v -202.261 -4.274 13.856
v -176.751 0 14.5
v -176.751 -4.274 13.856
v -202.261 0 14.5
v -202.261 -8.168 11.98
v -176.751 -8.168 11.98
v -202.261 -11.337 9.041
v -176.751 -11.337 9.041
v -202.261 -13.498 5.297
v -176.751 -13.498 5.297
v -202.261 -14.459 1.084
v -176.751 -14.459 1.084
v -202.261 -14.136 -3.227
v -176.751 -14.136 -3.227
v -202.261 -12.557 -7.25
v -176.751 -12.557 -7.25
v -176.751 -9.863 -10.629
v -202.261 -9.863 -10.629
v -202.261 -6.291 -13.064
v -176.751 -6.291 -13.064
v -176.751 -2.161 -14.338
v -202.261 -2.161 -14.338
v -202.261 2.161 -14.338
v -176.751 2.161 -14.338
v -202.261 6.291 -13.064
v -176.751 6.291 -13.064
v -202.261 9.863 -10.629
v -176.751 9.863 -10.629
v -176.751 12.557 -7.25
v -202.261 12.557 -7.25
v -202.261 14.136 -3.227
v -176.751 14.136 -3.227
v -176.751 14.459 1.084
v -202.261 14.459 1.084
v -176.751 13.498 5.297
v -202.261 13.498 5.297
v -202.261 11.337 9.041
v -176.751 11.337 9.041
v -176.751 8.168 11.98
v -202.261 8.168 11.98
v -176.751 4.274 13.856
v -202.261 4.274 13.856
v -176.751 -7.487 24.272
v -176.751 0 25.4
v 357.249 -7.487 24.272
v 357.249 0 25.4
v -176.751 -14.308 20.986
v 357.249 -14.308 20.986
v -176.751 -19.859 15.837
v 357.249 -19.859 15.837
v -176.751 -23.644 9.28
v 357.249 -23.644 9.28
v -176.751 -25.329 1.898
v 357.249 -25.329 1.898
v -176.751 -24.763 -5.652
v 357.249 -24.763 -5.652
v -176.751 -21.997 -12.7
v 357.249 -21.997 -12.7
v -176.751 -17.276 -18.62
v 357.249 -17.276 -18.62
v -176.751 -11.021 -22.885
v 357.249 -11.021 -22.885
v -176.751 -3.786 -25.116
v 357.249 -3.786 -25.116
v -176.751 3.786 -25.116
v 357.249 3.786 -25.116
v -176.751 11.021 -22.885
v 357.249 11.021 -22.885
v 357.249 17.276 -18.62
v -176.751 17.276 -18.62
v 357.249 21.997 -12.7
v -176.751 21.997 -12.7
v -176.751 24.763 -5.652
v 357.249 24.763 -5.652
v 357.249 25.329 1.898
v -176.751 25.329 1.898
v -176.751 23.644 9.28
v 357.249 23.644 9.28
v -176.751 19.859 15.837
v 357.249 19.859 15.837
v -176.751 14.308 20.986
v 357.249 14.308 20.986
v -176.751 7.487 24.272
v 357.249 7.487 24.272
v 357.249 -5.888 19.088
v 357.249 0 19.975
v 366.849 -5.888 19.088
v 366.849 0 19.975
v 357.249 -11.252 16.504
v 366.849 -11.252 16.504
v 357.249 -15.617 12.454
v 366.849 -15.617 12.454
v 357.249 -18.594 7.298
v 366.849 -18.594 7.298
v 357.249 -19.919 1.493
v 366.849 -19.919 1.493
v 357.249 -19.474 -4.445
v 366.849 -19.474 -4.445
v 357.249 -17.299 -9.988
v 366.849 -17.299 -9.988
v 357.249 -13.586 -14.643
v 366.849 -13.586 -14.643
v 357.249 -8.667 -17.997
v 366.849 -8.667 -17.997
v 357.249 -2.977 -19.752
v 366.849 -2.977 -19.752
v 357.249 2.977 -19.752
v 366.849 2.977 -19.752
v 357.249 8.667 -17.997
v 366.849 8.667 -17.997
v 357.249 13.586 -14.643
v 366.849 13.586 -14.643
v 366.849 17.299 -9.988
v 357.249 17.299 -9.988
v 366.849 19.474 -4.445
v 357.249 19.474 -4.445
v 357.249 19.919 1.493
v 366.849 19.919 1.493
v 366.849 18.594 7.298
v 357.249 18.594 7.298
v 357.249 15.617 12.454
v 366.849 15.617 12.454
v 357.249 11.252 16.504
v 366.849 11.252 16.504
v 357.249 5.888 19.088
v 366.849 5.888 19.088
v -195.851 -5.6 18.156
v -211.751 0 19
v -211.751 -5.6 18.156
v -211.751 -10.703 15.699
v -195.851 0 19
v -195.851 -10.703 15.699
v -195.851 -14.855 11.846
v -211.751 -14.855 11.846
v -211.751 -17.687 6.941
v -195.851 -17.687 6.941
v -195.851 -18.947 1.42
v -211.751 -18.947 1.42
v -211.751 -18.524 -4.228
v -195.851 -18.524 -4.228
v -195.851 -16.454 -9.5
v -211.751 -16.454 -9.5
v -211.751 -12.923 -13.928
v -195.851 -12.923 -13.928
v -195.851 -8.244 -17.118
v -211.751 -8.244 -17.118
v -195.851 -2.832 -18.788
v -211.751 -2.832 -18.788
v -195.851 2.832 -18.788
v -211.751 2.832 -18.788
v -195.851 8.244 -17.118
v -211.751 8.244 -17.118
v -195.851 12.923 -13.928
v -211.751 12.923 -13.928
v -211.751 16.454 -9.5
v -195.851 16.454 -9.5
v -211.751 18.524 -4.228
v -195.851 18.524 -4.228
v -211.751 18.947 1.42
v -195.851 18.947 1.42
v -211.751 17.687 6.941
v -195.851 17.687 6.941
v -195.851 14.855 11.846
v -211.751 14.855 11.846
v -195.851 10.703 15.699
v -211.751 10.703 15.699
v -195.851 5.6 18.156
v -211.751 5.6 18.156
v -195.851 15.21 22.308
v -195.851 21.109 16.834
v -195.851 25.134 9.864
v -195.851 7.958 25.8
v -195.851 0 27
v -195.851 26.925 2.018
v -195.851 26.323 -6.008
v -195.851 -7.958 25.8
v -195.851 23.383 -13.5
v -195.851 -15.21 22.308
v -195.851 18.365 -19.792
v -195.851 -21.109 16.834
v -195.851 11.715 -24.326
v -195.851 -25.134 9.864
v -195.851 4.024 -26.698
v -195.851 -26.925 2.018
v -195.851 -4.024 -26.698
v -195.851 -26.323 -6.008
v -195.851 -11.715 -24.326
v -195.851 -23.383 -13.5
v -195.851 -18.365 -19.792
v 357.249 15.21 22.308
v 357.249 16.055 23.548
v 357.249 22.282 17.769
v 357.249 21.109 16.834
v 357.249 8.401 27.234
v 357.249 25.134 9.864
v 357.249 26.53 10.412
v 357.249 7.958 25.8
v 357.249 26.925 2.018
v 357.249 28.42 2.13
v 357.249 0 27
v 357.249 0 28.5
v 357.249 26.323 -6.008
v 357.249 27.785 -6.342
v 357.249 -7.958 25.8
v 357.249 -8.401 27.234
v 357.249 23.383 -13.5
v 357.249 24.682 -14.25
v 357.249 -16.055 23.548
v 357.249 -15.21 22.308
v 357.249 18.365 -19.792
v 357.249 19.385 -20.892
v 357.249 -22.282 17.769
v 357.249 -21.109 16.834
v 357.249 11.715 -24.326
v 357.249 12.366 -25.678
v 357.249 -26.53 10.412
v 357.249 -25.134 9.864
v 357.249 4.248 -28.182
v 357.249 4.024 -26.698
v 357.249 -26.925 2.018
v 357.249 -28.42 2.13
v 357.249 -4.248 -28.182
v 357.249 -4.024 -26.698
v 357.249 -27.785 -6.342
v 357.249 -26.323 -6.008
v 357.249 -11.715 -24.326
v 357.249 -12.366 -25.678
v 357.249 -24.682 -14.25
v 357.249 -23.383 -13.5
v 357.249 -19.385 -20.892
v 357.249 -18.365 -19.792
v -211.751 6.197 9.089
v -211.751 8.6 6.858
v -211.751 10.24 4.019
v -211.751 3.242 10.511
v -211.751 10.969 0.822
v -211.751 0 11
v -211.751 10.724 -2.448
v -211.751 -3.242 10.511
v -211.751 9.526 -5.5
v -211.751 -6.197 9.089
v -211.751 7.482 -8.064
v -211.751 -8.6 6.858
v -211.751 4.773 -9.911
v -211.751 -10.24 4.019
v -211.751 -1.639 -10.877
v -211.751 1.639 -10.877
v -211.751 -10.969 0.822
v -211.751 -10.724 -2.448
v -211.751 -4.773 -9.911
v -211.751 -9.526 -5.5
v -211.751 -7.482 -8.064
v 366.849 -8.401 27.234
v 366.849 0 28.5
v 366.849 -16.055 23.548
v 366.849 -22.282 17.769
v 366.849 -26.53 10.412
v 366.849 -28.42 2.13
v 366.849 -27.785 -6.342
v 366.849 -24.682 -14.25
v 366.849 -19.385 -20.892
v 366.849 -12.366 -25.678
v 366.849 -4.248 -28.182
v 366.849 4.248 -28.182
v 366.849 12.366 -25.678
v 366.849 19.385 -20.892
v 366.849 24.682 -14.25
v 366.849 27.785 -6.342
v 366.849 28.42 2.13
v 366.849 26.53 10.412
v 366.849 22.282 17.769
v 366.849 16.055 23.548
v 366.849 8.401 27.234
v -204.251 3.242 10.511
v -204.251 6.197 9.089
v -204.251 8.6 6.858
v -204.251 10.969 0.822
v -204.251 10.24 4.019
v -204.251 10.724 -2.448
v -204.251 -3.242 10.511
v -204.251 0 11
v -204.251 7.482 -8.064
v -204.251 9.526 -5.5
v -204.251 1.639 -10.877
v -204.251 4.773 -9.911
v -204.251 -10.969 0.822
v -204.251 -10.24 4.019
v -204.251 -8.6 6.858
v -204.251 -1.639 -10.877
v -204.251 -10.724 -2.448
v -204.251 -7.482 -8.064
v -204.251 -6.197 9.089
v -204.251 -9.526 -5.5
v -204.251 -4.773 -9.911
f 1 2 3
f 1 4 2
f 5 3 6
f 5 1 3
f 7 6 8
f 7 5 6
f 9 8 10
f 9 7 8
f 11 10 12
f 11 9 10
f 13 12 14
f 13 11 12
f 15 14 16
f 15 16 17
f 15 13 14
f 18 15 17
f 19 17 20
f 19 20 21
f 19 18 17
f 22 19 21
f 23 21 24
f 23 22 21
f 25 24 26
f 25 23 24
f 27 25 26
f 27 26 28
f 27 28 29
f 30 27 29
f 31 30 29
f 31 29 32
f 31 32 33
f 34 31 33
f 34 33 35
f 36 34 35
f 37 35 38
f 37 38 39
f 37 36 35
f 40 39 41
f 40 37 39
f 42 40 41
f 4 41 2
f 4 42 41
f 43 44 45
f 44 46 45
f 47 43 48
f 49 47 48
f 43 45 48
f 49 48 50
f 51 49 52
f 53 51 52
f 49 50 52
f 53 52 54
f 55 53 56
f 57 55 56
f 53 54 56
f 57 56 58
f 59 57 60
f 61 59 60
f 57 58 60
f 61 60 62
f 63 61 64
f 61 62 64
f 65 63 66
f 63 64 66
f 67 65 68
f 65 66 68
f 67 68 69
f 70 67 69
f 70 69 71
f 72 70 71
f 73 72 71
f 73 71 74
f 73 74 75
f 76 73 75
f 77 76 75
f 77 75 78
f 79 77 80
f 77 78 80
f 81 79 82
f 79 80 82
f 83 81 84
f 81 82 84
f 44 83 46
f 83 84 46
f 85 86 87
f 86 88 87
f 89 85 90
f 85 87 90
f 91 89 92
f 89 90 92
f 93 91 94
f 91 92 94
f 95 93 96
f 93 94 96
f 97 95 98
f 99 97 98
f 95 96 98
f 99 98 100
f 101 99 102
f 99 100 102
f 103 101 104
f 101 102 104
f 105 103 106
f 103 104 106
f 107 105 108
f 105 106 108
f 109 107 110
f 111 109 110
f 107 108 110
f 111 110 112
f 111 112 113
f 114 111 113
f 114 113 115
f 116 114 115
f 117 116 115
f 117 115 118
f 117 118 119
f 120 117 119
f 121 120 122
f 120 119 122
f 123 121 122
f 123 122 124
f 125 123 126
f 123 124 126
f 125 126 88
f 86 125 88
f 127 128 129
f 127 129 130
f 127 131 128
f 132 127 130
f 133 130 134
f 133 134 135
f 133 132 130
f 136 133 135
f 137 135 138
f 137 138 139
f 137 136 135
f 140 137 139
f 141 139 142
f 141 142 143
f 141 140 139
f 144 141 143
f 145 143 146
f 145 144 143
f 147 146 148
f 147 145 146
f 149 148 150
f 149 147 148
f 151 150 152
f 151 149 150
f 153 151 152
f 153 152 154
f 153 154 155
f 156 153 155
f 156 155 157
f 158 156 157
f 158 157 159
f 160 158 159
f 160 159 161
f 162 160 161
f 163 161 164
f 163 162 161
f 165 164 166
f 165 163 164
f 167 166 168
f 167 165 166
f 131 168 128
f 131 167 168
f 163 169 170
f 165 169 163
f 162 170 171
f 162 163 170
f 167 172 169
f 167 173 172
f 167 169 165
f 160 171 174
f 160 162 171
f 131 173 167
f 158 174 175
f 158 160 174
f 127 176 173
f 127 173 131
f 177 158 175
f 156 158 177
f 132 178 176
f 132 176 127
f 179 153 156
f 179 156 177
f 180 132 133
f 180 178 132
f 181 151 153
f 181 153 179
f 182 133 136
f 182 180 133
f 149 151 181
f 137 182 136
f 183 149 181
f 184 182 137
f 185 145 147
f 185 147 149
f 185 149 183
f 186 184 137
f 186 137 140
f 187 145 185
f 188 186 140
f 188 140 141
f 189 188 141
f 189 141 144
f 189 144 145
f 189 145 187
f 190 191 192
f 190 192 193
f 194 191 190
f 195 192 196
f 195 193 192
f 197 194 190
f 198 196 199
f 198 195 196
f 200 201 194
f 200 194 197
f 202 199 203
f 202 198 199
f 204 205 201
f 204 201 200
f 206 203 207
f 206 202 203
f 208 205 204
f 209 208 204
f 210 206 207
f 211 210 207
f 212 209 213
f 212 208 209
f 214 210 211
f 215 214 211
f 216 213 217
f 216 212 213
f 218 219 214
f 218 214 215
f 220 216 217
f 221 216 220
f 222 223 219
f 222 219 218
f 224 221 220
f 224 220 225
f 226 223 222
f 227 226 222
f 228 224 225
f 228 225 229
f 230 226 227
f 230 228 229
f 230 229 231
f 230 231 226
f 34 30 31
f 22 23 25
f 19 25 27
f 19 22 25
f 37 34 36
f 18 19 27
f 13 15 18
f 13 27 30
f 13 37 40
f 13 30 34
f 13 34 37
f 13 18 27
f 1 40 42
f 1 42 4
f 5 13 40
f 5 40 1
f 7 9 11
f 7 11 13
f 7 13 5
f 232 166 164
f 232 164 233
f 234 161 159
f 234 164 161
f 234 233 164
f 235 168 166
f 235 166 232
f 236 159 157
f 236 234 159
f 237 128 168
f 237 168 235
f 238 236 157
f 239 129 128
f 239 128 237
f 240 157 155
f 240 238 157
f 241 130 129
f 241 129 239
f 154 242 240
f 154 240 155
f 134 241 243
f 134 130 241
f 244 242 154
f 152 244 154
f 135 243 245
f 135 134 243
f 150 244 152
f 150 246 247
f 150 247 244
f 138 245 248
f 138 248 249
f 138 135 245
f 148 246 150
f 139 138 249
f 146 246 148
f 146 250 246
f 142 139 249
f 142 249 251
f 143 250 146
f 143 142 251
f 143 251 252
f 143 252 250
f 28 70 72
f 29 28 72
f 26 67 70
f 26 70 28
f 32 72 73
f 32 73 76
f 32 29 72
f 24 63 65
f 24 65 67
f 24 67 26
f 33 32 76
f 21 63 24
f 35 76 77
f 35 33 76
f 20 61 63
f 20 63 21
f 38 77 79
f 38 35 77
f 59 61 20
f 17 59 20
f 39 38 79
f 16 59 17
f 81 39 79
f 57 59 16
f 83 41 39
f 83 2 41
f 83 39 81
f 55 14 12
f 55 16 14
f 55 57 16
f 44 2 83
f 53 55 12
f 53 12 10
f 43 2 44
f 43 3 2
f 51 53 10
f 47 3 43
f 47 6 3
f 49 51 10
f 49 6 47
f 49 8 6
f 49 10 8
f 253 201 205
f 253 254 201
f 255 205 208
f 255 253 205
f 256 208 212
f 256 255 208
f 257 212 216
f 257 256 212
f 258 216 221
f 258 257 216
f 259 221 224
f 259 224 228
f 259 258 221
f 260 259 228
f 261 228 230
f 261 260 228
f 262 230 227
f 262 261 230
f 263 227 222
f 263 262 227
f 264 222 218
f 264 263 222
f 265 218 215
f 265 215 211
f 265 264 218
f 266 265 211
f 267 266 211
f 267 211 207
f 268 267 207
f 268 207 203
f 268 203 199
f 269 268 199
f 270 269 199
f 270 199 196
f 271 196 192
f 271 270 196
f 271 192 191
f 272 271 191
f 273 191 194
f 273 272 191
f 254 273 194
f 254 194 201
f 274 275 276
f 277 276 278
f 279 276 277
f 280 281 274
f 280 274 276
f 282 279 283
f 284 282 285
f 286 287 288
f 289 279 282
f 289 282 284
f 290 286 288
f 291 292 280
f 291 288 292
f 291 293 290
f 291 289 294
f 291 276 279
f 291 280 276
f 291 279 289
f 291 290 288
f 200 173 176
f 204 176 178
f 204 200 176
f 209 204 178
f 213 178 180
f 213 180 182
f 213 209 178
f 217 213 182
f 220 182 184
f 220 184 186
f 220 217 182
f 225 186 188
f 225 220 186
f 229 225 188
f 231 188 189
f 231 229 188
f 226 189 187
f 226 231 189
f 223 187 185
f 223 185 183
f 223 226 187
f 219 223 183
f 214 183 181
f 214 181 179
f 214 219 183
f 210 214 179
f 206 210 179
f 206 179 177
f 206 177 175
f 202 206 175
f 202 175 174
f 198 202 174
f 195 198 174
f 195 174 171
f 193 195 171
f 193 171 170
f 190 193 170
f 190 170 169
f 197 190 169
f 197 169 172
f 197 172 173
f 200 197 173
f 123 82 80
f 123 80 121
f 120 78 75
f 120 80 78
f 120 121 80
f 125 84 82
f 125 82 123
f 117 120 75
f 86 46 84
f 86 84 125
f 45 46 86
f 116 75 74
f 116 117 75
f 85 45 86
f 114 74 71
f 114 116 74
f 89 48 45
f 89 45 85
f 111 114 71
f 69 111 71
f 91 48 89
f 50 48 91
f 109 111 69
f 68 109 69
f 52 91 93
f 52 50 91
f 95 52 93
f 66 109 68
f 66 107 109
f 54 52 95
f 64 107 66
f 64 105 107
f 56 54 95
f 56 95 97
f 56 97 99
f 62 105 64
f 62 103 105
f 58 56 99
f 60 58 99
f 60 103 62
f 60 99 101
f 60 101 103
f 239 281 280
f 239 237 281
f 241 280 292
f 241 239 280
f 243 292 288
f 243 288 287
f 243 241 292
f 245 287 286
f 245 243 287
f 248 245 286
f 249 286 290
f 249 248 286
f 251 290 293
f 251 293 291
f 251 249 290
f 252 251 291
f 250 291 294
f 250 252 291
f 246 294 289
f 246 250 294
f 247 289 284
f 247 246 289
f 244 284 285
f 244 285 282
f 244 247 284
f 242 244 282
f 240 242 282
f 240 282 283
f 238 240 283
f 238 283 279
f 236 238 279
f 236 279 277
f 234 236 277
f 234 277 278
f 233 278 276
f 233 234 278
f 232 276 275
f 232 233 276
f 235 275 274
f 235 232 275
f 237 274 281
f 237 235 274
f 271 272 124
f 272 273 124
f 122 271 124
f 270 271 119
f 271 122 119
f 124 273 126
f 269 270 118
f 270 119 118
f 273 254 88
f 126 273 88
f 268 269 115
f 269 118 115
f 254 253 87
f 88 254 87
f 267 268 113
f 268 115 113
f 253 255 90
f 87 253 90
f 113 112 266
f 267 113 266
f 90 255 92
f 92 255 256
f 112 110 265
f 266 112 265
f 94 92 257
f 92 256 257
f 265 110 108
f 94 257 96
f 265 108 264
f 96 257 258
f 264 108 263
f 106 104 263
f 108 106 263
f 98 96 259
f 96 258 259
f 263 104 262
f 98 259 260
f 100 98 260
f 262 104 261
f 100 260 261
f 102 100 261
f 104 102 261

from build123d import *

# Parameters (mm, degrees)
SKETCH1_W = 550
SKETCH1_H = 1.6
SKETCH2_W = 9.6
SKETCH2_H = 8.524943062


with BuildPart() as part:
    # Sketch1 → Revolve1 (revolve)
    with BuildSketch(Plane.XY, mode=Mode.PRIVATE) as revolve1_sk:
        with Locations((82.249266675, 26.2)):
            Rectangle(SKETCH1_W, SKETCH1_H)
    revolve(revolve1_sk.sketch.rotate(Axis((-404.790100073, 0, 0), (1, 0, 0)), 90), axis=Axis((-404.790100073, 0, 0), (1, 0, 0)))

    # Sketch2 → Revolve2 (revolve)
    with BuildSketch(Plane.XY, mode=Mode.PRIVATE) as revolve2_sk:
        with Locations((362.049266675, 24.237528469)):
            Rectangle(SKETCH2_W, SKETCH2_H)
        Polygon((-176.750733325, 27), (-176.750733325, 14.5), (-202.260733325, 14.5), (-202.260733325, 0), (-204.250733325, 0), (-204.250733325, 11), (-211.750733325, 11), (-211.750733325, 19), (-195.850733325, 19), (-195.850733325, 27), align=None)
    revolve(revolve2_sk.sketch.rotate(Axis((-209.882463346, 0, 0), (1, 0, 0)), 90), axis=Axis((-209.882463346, 0, 0), (1, 0, 0)))


solid = part.part
